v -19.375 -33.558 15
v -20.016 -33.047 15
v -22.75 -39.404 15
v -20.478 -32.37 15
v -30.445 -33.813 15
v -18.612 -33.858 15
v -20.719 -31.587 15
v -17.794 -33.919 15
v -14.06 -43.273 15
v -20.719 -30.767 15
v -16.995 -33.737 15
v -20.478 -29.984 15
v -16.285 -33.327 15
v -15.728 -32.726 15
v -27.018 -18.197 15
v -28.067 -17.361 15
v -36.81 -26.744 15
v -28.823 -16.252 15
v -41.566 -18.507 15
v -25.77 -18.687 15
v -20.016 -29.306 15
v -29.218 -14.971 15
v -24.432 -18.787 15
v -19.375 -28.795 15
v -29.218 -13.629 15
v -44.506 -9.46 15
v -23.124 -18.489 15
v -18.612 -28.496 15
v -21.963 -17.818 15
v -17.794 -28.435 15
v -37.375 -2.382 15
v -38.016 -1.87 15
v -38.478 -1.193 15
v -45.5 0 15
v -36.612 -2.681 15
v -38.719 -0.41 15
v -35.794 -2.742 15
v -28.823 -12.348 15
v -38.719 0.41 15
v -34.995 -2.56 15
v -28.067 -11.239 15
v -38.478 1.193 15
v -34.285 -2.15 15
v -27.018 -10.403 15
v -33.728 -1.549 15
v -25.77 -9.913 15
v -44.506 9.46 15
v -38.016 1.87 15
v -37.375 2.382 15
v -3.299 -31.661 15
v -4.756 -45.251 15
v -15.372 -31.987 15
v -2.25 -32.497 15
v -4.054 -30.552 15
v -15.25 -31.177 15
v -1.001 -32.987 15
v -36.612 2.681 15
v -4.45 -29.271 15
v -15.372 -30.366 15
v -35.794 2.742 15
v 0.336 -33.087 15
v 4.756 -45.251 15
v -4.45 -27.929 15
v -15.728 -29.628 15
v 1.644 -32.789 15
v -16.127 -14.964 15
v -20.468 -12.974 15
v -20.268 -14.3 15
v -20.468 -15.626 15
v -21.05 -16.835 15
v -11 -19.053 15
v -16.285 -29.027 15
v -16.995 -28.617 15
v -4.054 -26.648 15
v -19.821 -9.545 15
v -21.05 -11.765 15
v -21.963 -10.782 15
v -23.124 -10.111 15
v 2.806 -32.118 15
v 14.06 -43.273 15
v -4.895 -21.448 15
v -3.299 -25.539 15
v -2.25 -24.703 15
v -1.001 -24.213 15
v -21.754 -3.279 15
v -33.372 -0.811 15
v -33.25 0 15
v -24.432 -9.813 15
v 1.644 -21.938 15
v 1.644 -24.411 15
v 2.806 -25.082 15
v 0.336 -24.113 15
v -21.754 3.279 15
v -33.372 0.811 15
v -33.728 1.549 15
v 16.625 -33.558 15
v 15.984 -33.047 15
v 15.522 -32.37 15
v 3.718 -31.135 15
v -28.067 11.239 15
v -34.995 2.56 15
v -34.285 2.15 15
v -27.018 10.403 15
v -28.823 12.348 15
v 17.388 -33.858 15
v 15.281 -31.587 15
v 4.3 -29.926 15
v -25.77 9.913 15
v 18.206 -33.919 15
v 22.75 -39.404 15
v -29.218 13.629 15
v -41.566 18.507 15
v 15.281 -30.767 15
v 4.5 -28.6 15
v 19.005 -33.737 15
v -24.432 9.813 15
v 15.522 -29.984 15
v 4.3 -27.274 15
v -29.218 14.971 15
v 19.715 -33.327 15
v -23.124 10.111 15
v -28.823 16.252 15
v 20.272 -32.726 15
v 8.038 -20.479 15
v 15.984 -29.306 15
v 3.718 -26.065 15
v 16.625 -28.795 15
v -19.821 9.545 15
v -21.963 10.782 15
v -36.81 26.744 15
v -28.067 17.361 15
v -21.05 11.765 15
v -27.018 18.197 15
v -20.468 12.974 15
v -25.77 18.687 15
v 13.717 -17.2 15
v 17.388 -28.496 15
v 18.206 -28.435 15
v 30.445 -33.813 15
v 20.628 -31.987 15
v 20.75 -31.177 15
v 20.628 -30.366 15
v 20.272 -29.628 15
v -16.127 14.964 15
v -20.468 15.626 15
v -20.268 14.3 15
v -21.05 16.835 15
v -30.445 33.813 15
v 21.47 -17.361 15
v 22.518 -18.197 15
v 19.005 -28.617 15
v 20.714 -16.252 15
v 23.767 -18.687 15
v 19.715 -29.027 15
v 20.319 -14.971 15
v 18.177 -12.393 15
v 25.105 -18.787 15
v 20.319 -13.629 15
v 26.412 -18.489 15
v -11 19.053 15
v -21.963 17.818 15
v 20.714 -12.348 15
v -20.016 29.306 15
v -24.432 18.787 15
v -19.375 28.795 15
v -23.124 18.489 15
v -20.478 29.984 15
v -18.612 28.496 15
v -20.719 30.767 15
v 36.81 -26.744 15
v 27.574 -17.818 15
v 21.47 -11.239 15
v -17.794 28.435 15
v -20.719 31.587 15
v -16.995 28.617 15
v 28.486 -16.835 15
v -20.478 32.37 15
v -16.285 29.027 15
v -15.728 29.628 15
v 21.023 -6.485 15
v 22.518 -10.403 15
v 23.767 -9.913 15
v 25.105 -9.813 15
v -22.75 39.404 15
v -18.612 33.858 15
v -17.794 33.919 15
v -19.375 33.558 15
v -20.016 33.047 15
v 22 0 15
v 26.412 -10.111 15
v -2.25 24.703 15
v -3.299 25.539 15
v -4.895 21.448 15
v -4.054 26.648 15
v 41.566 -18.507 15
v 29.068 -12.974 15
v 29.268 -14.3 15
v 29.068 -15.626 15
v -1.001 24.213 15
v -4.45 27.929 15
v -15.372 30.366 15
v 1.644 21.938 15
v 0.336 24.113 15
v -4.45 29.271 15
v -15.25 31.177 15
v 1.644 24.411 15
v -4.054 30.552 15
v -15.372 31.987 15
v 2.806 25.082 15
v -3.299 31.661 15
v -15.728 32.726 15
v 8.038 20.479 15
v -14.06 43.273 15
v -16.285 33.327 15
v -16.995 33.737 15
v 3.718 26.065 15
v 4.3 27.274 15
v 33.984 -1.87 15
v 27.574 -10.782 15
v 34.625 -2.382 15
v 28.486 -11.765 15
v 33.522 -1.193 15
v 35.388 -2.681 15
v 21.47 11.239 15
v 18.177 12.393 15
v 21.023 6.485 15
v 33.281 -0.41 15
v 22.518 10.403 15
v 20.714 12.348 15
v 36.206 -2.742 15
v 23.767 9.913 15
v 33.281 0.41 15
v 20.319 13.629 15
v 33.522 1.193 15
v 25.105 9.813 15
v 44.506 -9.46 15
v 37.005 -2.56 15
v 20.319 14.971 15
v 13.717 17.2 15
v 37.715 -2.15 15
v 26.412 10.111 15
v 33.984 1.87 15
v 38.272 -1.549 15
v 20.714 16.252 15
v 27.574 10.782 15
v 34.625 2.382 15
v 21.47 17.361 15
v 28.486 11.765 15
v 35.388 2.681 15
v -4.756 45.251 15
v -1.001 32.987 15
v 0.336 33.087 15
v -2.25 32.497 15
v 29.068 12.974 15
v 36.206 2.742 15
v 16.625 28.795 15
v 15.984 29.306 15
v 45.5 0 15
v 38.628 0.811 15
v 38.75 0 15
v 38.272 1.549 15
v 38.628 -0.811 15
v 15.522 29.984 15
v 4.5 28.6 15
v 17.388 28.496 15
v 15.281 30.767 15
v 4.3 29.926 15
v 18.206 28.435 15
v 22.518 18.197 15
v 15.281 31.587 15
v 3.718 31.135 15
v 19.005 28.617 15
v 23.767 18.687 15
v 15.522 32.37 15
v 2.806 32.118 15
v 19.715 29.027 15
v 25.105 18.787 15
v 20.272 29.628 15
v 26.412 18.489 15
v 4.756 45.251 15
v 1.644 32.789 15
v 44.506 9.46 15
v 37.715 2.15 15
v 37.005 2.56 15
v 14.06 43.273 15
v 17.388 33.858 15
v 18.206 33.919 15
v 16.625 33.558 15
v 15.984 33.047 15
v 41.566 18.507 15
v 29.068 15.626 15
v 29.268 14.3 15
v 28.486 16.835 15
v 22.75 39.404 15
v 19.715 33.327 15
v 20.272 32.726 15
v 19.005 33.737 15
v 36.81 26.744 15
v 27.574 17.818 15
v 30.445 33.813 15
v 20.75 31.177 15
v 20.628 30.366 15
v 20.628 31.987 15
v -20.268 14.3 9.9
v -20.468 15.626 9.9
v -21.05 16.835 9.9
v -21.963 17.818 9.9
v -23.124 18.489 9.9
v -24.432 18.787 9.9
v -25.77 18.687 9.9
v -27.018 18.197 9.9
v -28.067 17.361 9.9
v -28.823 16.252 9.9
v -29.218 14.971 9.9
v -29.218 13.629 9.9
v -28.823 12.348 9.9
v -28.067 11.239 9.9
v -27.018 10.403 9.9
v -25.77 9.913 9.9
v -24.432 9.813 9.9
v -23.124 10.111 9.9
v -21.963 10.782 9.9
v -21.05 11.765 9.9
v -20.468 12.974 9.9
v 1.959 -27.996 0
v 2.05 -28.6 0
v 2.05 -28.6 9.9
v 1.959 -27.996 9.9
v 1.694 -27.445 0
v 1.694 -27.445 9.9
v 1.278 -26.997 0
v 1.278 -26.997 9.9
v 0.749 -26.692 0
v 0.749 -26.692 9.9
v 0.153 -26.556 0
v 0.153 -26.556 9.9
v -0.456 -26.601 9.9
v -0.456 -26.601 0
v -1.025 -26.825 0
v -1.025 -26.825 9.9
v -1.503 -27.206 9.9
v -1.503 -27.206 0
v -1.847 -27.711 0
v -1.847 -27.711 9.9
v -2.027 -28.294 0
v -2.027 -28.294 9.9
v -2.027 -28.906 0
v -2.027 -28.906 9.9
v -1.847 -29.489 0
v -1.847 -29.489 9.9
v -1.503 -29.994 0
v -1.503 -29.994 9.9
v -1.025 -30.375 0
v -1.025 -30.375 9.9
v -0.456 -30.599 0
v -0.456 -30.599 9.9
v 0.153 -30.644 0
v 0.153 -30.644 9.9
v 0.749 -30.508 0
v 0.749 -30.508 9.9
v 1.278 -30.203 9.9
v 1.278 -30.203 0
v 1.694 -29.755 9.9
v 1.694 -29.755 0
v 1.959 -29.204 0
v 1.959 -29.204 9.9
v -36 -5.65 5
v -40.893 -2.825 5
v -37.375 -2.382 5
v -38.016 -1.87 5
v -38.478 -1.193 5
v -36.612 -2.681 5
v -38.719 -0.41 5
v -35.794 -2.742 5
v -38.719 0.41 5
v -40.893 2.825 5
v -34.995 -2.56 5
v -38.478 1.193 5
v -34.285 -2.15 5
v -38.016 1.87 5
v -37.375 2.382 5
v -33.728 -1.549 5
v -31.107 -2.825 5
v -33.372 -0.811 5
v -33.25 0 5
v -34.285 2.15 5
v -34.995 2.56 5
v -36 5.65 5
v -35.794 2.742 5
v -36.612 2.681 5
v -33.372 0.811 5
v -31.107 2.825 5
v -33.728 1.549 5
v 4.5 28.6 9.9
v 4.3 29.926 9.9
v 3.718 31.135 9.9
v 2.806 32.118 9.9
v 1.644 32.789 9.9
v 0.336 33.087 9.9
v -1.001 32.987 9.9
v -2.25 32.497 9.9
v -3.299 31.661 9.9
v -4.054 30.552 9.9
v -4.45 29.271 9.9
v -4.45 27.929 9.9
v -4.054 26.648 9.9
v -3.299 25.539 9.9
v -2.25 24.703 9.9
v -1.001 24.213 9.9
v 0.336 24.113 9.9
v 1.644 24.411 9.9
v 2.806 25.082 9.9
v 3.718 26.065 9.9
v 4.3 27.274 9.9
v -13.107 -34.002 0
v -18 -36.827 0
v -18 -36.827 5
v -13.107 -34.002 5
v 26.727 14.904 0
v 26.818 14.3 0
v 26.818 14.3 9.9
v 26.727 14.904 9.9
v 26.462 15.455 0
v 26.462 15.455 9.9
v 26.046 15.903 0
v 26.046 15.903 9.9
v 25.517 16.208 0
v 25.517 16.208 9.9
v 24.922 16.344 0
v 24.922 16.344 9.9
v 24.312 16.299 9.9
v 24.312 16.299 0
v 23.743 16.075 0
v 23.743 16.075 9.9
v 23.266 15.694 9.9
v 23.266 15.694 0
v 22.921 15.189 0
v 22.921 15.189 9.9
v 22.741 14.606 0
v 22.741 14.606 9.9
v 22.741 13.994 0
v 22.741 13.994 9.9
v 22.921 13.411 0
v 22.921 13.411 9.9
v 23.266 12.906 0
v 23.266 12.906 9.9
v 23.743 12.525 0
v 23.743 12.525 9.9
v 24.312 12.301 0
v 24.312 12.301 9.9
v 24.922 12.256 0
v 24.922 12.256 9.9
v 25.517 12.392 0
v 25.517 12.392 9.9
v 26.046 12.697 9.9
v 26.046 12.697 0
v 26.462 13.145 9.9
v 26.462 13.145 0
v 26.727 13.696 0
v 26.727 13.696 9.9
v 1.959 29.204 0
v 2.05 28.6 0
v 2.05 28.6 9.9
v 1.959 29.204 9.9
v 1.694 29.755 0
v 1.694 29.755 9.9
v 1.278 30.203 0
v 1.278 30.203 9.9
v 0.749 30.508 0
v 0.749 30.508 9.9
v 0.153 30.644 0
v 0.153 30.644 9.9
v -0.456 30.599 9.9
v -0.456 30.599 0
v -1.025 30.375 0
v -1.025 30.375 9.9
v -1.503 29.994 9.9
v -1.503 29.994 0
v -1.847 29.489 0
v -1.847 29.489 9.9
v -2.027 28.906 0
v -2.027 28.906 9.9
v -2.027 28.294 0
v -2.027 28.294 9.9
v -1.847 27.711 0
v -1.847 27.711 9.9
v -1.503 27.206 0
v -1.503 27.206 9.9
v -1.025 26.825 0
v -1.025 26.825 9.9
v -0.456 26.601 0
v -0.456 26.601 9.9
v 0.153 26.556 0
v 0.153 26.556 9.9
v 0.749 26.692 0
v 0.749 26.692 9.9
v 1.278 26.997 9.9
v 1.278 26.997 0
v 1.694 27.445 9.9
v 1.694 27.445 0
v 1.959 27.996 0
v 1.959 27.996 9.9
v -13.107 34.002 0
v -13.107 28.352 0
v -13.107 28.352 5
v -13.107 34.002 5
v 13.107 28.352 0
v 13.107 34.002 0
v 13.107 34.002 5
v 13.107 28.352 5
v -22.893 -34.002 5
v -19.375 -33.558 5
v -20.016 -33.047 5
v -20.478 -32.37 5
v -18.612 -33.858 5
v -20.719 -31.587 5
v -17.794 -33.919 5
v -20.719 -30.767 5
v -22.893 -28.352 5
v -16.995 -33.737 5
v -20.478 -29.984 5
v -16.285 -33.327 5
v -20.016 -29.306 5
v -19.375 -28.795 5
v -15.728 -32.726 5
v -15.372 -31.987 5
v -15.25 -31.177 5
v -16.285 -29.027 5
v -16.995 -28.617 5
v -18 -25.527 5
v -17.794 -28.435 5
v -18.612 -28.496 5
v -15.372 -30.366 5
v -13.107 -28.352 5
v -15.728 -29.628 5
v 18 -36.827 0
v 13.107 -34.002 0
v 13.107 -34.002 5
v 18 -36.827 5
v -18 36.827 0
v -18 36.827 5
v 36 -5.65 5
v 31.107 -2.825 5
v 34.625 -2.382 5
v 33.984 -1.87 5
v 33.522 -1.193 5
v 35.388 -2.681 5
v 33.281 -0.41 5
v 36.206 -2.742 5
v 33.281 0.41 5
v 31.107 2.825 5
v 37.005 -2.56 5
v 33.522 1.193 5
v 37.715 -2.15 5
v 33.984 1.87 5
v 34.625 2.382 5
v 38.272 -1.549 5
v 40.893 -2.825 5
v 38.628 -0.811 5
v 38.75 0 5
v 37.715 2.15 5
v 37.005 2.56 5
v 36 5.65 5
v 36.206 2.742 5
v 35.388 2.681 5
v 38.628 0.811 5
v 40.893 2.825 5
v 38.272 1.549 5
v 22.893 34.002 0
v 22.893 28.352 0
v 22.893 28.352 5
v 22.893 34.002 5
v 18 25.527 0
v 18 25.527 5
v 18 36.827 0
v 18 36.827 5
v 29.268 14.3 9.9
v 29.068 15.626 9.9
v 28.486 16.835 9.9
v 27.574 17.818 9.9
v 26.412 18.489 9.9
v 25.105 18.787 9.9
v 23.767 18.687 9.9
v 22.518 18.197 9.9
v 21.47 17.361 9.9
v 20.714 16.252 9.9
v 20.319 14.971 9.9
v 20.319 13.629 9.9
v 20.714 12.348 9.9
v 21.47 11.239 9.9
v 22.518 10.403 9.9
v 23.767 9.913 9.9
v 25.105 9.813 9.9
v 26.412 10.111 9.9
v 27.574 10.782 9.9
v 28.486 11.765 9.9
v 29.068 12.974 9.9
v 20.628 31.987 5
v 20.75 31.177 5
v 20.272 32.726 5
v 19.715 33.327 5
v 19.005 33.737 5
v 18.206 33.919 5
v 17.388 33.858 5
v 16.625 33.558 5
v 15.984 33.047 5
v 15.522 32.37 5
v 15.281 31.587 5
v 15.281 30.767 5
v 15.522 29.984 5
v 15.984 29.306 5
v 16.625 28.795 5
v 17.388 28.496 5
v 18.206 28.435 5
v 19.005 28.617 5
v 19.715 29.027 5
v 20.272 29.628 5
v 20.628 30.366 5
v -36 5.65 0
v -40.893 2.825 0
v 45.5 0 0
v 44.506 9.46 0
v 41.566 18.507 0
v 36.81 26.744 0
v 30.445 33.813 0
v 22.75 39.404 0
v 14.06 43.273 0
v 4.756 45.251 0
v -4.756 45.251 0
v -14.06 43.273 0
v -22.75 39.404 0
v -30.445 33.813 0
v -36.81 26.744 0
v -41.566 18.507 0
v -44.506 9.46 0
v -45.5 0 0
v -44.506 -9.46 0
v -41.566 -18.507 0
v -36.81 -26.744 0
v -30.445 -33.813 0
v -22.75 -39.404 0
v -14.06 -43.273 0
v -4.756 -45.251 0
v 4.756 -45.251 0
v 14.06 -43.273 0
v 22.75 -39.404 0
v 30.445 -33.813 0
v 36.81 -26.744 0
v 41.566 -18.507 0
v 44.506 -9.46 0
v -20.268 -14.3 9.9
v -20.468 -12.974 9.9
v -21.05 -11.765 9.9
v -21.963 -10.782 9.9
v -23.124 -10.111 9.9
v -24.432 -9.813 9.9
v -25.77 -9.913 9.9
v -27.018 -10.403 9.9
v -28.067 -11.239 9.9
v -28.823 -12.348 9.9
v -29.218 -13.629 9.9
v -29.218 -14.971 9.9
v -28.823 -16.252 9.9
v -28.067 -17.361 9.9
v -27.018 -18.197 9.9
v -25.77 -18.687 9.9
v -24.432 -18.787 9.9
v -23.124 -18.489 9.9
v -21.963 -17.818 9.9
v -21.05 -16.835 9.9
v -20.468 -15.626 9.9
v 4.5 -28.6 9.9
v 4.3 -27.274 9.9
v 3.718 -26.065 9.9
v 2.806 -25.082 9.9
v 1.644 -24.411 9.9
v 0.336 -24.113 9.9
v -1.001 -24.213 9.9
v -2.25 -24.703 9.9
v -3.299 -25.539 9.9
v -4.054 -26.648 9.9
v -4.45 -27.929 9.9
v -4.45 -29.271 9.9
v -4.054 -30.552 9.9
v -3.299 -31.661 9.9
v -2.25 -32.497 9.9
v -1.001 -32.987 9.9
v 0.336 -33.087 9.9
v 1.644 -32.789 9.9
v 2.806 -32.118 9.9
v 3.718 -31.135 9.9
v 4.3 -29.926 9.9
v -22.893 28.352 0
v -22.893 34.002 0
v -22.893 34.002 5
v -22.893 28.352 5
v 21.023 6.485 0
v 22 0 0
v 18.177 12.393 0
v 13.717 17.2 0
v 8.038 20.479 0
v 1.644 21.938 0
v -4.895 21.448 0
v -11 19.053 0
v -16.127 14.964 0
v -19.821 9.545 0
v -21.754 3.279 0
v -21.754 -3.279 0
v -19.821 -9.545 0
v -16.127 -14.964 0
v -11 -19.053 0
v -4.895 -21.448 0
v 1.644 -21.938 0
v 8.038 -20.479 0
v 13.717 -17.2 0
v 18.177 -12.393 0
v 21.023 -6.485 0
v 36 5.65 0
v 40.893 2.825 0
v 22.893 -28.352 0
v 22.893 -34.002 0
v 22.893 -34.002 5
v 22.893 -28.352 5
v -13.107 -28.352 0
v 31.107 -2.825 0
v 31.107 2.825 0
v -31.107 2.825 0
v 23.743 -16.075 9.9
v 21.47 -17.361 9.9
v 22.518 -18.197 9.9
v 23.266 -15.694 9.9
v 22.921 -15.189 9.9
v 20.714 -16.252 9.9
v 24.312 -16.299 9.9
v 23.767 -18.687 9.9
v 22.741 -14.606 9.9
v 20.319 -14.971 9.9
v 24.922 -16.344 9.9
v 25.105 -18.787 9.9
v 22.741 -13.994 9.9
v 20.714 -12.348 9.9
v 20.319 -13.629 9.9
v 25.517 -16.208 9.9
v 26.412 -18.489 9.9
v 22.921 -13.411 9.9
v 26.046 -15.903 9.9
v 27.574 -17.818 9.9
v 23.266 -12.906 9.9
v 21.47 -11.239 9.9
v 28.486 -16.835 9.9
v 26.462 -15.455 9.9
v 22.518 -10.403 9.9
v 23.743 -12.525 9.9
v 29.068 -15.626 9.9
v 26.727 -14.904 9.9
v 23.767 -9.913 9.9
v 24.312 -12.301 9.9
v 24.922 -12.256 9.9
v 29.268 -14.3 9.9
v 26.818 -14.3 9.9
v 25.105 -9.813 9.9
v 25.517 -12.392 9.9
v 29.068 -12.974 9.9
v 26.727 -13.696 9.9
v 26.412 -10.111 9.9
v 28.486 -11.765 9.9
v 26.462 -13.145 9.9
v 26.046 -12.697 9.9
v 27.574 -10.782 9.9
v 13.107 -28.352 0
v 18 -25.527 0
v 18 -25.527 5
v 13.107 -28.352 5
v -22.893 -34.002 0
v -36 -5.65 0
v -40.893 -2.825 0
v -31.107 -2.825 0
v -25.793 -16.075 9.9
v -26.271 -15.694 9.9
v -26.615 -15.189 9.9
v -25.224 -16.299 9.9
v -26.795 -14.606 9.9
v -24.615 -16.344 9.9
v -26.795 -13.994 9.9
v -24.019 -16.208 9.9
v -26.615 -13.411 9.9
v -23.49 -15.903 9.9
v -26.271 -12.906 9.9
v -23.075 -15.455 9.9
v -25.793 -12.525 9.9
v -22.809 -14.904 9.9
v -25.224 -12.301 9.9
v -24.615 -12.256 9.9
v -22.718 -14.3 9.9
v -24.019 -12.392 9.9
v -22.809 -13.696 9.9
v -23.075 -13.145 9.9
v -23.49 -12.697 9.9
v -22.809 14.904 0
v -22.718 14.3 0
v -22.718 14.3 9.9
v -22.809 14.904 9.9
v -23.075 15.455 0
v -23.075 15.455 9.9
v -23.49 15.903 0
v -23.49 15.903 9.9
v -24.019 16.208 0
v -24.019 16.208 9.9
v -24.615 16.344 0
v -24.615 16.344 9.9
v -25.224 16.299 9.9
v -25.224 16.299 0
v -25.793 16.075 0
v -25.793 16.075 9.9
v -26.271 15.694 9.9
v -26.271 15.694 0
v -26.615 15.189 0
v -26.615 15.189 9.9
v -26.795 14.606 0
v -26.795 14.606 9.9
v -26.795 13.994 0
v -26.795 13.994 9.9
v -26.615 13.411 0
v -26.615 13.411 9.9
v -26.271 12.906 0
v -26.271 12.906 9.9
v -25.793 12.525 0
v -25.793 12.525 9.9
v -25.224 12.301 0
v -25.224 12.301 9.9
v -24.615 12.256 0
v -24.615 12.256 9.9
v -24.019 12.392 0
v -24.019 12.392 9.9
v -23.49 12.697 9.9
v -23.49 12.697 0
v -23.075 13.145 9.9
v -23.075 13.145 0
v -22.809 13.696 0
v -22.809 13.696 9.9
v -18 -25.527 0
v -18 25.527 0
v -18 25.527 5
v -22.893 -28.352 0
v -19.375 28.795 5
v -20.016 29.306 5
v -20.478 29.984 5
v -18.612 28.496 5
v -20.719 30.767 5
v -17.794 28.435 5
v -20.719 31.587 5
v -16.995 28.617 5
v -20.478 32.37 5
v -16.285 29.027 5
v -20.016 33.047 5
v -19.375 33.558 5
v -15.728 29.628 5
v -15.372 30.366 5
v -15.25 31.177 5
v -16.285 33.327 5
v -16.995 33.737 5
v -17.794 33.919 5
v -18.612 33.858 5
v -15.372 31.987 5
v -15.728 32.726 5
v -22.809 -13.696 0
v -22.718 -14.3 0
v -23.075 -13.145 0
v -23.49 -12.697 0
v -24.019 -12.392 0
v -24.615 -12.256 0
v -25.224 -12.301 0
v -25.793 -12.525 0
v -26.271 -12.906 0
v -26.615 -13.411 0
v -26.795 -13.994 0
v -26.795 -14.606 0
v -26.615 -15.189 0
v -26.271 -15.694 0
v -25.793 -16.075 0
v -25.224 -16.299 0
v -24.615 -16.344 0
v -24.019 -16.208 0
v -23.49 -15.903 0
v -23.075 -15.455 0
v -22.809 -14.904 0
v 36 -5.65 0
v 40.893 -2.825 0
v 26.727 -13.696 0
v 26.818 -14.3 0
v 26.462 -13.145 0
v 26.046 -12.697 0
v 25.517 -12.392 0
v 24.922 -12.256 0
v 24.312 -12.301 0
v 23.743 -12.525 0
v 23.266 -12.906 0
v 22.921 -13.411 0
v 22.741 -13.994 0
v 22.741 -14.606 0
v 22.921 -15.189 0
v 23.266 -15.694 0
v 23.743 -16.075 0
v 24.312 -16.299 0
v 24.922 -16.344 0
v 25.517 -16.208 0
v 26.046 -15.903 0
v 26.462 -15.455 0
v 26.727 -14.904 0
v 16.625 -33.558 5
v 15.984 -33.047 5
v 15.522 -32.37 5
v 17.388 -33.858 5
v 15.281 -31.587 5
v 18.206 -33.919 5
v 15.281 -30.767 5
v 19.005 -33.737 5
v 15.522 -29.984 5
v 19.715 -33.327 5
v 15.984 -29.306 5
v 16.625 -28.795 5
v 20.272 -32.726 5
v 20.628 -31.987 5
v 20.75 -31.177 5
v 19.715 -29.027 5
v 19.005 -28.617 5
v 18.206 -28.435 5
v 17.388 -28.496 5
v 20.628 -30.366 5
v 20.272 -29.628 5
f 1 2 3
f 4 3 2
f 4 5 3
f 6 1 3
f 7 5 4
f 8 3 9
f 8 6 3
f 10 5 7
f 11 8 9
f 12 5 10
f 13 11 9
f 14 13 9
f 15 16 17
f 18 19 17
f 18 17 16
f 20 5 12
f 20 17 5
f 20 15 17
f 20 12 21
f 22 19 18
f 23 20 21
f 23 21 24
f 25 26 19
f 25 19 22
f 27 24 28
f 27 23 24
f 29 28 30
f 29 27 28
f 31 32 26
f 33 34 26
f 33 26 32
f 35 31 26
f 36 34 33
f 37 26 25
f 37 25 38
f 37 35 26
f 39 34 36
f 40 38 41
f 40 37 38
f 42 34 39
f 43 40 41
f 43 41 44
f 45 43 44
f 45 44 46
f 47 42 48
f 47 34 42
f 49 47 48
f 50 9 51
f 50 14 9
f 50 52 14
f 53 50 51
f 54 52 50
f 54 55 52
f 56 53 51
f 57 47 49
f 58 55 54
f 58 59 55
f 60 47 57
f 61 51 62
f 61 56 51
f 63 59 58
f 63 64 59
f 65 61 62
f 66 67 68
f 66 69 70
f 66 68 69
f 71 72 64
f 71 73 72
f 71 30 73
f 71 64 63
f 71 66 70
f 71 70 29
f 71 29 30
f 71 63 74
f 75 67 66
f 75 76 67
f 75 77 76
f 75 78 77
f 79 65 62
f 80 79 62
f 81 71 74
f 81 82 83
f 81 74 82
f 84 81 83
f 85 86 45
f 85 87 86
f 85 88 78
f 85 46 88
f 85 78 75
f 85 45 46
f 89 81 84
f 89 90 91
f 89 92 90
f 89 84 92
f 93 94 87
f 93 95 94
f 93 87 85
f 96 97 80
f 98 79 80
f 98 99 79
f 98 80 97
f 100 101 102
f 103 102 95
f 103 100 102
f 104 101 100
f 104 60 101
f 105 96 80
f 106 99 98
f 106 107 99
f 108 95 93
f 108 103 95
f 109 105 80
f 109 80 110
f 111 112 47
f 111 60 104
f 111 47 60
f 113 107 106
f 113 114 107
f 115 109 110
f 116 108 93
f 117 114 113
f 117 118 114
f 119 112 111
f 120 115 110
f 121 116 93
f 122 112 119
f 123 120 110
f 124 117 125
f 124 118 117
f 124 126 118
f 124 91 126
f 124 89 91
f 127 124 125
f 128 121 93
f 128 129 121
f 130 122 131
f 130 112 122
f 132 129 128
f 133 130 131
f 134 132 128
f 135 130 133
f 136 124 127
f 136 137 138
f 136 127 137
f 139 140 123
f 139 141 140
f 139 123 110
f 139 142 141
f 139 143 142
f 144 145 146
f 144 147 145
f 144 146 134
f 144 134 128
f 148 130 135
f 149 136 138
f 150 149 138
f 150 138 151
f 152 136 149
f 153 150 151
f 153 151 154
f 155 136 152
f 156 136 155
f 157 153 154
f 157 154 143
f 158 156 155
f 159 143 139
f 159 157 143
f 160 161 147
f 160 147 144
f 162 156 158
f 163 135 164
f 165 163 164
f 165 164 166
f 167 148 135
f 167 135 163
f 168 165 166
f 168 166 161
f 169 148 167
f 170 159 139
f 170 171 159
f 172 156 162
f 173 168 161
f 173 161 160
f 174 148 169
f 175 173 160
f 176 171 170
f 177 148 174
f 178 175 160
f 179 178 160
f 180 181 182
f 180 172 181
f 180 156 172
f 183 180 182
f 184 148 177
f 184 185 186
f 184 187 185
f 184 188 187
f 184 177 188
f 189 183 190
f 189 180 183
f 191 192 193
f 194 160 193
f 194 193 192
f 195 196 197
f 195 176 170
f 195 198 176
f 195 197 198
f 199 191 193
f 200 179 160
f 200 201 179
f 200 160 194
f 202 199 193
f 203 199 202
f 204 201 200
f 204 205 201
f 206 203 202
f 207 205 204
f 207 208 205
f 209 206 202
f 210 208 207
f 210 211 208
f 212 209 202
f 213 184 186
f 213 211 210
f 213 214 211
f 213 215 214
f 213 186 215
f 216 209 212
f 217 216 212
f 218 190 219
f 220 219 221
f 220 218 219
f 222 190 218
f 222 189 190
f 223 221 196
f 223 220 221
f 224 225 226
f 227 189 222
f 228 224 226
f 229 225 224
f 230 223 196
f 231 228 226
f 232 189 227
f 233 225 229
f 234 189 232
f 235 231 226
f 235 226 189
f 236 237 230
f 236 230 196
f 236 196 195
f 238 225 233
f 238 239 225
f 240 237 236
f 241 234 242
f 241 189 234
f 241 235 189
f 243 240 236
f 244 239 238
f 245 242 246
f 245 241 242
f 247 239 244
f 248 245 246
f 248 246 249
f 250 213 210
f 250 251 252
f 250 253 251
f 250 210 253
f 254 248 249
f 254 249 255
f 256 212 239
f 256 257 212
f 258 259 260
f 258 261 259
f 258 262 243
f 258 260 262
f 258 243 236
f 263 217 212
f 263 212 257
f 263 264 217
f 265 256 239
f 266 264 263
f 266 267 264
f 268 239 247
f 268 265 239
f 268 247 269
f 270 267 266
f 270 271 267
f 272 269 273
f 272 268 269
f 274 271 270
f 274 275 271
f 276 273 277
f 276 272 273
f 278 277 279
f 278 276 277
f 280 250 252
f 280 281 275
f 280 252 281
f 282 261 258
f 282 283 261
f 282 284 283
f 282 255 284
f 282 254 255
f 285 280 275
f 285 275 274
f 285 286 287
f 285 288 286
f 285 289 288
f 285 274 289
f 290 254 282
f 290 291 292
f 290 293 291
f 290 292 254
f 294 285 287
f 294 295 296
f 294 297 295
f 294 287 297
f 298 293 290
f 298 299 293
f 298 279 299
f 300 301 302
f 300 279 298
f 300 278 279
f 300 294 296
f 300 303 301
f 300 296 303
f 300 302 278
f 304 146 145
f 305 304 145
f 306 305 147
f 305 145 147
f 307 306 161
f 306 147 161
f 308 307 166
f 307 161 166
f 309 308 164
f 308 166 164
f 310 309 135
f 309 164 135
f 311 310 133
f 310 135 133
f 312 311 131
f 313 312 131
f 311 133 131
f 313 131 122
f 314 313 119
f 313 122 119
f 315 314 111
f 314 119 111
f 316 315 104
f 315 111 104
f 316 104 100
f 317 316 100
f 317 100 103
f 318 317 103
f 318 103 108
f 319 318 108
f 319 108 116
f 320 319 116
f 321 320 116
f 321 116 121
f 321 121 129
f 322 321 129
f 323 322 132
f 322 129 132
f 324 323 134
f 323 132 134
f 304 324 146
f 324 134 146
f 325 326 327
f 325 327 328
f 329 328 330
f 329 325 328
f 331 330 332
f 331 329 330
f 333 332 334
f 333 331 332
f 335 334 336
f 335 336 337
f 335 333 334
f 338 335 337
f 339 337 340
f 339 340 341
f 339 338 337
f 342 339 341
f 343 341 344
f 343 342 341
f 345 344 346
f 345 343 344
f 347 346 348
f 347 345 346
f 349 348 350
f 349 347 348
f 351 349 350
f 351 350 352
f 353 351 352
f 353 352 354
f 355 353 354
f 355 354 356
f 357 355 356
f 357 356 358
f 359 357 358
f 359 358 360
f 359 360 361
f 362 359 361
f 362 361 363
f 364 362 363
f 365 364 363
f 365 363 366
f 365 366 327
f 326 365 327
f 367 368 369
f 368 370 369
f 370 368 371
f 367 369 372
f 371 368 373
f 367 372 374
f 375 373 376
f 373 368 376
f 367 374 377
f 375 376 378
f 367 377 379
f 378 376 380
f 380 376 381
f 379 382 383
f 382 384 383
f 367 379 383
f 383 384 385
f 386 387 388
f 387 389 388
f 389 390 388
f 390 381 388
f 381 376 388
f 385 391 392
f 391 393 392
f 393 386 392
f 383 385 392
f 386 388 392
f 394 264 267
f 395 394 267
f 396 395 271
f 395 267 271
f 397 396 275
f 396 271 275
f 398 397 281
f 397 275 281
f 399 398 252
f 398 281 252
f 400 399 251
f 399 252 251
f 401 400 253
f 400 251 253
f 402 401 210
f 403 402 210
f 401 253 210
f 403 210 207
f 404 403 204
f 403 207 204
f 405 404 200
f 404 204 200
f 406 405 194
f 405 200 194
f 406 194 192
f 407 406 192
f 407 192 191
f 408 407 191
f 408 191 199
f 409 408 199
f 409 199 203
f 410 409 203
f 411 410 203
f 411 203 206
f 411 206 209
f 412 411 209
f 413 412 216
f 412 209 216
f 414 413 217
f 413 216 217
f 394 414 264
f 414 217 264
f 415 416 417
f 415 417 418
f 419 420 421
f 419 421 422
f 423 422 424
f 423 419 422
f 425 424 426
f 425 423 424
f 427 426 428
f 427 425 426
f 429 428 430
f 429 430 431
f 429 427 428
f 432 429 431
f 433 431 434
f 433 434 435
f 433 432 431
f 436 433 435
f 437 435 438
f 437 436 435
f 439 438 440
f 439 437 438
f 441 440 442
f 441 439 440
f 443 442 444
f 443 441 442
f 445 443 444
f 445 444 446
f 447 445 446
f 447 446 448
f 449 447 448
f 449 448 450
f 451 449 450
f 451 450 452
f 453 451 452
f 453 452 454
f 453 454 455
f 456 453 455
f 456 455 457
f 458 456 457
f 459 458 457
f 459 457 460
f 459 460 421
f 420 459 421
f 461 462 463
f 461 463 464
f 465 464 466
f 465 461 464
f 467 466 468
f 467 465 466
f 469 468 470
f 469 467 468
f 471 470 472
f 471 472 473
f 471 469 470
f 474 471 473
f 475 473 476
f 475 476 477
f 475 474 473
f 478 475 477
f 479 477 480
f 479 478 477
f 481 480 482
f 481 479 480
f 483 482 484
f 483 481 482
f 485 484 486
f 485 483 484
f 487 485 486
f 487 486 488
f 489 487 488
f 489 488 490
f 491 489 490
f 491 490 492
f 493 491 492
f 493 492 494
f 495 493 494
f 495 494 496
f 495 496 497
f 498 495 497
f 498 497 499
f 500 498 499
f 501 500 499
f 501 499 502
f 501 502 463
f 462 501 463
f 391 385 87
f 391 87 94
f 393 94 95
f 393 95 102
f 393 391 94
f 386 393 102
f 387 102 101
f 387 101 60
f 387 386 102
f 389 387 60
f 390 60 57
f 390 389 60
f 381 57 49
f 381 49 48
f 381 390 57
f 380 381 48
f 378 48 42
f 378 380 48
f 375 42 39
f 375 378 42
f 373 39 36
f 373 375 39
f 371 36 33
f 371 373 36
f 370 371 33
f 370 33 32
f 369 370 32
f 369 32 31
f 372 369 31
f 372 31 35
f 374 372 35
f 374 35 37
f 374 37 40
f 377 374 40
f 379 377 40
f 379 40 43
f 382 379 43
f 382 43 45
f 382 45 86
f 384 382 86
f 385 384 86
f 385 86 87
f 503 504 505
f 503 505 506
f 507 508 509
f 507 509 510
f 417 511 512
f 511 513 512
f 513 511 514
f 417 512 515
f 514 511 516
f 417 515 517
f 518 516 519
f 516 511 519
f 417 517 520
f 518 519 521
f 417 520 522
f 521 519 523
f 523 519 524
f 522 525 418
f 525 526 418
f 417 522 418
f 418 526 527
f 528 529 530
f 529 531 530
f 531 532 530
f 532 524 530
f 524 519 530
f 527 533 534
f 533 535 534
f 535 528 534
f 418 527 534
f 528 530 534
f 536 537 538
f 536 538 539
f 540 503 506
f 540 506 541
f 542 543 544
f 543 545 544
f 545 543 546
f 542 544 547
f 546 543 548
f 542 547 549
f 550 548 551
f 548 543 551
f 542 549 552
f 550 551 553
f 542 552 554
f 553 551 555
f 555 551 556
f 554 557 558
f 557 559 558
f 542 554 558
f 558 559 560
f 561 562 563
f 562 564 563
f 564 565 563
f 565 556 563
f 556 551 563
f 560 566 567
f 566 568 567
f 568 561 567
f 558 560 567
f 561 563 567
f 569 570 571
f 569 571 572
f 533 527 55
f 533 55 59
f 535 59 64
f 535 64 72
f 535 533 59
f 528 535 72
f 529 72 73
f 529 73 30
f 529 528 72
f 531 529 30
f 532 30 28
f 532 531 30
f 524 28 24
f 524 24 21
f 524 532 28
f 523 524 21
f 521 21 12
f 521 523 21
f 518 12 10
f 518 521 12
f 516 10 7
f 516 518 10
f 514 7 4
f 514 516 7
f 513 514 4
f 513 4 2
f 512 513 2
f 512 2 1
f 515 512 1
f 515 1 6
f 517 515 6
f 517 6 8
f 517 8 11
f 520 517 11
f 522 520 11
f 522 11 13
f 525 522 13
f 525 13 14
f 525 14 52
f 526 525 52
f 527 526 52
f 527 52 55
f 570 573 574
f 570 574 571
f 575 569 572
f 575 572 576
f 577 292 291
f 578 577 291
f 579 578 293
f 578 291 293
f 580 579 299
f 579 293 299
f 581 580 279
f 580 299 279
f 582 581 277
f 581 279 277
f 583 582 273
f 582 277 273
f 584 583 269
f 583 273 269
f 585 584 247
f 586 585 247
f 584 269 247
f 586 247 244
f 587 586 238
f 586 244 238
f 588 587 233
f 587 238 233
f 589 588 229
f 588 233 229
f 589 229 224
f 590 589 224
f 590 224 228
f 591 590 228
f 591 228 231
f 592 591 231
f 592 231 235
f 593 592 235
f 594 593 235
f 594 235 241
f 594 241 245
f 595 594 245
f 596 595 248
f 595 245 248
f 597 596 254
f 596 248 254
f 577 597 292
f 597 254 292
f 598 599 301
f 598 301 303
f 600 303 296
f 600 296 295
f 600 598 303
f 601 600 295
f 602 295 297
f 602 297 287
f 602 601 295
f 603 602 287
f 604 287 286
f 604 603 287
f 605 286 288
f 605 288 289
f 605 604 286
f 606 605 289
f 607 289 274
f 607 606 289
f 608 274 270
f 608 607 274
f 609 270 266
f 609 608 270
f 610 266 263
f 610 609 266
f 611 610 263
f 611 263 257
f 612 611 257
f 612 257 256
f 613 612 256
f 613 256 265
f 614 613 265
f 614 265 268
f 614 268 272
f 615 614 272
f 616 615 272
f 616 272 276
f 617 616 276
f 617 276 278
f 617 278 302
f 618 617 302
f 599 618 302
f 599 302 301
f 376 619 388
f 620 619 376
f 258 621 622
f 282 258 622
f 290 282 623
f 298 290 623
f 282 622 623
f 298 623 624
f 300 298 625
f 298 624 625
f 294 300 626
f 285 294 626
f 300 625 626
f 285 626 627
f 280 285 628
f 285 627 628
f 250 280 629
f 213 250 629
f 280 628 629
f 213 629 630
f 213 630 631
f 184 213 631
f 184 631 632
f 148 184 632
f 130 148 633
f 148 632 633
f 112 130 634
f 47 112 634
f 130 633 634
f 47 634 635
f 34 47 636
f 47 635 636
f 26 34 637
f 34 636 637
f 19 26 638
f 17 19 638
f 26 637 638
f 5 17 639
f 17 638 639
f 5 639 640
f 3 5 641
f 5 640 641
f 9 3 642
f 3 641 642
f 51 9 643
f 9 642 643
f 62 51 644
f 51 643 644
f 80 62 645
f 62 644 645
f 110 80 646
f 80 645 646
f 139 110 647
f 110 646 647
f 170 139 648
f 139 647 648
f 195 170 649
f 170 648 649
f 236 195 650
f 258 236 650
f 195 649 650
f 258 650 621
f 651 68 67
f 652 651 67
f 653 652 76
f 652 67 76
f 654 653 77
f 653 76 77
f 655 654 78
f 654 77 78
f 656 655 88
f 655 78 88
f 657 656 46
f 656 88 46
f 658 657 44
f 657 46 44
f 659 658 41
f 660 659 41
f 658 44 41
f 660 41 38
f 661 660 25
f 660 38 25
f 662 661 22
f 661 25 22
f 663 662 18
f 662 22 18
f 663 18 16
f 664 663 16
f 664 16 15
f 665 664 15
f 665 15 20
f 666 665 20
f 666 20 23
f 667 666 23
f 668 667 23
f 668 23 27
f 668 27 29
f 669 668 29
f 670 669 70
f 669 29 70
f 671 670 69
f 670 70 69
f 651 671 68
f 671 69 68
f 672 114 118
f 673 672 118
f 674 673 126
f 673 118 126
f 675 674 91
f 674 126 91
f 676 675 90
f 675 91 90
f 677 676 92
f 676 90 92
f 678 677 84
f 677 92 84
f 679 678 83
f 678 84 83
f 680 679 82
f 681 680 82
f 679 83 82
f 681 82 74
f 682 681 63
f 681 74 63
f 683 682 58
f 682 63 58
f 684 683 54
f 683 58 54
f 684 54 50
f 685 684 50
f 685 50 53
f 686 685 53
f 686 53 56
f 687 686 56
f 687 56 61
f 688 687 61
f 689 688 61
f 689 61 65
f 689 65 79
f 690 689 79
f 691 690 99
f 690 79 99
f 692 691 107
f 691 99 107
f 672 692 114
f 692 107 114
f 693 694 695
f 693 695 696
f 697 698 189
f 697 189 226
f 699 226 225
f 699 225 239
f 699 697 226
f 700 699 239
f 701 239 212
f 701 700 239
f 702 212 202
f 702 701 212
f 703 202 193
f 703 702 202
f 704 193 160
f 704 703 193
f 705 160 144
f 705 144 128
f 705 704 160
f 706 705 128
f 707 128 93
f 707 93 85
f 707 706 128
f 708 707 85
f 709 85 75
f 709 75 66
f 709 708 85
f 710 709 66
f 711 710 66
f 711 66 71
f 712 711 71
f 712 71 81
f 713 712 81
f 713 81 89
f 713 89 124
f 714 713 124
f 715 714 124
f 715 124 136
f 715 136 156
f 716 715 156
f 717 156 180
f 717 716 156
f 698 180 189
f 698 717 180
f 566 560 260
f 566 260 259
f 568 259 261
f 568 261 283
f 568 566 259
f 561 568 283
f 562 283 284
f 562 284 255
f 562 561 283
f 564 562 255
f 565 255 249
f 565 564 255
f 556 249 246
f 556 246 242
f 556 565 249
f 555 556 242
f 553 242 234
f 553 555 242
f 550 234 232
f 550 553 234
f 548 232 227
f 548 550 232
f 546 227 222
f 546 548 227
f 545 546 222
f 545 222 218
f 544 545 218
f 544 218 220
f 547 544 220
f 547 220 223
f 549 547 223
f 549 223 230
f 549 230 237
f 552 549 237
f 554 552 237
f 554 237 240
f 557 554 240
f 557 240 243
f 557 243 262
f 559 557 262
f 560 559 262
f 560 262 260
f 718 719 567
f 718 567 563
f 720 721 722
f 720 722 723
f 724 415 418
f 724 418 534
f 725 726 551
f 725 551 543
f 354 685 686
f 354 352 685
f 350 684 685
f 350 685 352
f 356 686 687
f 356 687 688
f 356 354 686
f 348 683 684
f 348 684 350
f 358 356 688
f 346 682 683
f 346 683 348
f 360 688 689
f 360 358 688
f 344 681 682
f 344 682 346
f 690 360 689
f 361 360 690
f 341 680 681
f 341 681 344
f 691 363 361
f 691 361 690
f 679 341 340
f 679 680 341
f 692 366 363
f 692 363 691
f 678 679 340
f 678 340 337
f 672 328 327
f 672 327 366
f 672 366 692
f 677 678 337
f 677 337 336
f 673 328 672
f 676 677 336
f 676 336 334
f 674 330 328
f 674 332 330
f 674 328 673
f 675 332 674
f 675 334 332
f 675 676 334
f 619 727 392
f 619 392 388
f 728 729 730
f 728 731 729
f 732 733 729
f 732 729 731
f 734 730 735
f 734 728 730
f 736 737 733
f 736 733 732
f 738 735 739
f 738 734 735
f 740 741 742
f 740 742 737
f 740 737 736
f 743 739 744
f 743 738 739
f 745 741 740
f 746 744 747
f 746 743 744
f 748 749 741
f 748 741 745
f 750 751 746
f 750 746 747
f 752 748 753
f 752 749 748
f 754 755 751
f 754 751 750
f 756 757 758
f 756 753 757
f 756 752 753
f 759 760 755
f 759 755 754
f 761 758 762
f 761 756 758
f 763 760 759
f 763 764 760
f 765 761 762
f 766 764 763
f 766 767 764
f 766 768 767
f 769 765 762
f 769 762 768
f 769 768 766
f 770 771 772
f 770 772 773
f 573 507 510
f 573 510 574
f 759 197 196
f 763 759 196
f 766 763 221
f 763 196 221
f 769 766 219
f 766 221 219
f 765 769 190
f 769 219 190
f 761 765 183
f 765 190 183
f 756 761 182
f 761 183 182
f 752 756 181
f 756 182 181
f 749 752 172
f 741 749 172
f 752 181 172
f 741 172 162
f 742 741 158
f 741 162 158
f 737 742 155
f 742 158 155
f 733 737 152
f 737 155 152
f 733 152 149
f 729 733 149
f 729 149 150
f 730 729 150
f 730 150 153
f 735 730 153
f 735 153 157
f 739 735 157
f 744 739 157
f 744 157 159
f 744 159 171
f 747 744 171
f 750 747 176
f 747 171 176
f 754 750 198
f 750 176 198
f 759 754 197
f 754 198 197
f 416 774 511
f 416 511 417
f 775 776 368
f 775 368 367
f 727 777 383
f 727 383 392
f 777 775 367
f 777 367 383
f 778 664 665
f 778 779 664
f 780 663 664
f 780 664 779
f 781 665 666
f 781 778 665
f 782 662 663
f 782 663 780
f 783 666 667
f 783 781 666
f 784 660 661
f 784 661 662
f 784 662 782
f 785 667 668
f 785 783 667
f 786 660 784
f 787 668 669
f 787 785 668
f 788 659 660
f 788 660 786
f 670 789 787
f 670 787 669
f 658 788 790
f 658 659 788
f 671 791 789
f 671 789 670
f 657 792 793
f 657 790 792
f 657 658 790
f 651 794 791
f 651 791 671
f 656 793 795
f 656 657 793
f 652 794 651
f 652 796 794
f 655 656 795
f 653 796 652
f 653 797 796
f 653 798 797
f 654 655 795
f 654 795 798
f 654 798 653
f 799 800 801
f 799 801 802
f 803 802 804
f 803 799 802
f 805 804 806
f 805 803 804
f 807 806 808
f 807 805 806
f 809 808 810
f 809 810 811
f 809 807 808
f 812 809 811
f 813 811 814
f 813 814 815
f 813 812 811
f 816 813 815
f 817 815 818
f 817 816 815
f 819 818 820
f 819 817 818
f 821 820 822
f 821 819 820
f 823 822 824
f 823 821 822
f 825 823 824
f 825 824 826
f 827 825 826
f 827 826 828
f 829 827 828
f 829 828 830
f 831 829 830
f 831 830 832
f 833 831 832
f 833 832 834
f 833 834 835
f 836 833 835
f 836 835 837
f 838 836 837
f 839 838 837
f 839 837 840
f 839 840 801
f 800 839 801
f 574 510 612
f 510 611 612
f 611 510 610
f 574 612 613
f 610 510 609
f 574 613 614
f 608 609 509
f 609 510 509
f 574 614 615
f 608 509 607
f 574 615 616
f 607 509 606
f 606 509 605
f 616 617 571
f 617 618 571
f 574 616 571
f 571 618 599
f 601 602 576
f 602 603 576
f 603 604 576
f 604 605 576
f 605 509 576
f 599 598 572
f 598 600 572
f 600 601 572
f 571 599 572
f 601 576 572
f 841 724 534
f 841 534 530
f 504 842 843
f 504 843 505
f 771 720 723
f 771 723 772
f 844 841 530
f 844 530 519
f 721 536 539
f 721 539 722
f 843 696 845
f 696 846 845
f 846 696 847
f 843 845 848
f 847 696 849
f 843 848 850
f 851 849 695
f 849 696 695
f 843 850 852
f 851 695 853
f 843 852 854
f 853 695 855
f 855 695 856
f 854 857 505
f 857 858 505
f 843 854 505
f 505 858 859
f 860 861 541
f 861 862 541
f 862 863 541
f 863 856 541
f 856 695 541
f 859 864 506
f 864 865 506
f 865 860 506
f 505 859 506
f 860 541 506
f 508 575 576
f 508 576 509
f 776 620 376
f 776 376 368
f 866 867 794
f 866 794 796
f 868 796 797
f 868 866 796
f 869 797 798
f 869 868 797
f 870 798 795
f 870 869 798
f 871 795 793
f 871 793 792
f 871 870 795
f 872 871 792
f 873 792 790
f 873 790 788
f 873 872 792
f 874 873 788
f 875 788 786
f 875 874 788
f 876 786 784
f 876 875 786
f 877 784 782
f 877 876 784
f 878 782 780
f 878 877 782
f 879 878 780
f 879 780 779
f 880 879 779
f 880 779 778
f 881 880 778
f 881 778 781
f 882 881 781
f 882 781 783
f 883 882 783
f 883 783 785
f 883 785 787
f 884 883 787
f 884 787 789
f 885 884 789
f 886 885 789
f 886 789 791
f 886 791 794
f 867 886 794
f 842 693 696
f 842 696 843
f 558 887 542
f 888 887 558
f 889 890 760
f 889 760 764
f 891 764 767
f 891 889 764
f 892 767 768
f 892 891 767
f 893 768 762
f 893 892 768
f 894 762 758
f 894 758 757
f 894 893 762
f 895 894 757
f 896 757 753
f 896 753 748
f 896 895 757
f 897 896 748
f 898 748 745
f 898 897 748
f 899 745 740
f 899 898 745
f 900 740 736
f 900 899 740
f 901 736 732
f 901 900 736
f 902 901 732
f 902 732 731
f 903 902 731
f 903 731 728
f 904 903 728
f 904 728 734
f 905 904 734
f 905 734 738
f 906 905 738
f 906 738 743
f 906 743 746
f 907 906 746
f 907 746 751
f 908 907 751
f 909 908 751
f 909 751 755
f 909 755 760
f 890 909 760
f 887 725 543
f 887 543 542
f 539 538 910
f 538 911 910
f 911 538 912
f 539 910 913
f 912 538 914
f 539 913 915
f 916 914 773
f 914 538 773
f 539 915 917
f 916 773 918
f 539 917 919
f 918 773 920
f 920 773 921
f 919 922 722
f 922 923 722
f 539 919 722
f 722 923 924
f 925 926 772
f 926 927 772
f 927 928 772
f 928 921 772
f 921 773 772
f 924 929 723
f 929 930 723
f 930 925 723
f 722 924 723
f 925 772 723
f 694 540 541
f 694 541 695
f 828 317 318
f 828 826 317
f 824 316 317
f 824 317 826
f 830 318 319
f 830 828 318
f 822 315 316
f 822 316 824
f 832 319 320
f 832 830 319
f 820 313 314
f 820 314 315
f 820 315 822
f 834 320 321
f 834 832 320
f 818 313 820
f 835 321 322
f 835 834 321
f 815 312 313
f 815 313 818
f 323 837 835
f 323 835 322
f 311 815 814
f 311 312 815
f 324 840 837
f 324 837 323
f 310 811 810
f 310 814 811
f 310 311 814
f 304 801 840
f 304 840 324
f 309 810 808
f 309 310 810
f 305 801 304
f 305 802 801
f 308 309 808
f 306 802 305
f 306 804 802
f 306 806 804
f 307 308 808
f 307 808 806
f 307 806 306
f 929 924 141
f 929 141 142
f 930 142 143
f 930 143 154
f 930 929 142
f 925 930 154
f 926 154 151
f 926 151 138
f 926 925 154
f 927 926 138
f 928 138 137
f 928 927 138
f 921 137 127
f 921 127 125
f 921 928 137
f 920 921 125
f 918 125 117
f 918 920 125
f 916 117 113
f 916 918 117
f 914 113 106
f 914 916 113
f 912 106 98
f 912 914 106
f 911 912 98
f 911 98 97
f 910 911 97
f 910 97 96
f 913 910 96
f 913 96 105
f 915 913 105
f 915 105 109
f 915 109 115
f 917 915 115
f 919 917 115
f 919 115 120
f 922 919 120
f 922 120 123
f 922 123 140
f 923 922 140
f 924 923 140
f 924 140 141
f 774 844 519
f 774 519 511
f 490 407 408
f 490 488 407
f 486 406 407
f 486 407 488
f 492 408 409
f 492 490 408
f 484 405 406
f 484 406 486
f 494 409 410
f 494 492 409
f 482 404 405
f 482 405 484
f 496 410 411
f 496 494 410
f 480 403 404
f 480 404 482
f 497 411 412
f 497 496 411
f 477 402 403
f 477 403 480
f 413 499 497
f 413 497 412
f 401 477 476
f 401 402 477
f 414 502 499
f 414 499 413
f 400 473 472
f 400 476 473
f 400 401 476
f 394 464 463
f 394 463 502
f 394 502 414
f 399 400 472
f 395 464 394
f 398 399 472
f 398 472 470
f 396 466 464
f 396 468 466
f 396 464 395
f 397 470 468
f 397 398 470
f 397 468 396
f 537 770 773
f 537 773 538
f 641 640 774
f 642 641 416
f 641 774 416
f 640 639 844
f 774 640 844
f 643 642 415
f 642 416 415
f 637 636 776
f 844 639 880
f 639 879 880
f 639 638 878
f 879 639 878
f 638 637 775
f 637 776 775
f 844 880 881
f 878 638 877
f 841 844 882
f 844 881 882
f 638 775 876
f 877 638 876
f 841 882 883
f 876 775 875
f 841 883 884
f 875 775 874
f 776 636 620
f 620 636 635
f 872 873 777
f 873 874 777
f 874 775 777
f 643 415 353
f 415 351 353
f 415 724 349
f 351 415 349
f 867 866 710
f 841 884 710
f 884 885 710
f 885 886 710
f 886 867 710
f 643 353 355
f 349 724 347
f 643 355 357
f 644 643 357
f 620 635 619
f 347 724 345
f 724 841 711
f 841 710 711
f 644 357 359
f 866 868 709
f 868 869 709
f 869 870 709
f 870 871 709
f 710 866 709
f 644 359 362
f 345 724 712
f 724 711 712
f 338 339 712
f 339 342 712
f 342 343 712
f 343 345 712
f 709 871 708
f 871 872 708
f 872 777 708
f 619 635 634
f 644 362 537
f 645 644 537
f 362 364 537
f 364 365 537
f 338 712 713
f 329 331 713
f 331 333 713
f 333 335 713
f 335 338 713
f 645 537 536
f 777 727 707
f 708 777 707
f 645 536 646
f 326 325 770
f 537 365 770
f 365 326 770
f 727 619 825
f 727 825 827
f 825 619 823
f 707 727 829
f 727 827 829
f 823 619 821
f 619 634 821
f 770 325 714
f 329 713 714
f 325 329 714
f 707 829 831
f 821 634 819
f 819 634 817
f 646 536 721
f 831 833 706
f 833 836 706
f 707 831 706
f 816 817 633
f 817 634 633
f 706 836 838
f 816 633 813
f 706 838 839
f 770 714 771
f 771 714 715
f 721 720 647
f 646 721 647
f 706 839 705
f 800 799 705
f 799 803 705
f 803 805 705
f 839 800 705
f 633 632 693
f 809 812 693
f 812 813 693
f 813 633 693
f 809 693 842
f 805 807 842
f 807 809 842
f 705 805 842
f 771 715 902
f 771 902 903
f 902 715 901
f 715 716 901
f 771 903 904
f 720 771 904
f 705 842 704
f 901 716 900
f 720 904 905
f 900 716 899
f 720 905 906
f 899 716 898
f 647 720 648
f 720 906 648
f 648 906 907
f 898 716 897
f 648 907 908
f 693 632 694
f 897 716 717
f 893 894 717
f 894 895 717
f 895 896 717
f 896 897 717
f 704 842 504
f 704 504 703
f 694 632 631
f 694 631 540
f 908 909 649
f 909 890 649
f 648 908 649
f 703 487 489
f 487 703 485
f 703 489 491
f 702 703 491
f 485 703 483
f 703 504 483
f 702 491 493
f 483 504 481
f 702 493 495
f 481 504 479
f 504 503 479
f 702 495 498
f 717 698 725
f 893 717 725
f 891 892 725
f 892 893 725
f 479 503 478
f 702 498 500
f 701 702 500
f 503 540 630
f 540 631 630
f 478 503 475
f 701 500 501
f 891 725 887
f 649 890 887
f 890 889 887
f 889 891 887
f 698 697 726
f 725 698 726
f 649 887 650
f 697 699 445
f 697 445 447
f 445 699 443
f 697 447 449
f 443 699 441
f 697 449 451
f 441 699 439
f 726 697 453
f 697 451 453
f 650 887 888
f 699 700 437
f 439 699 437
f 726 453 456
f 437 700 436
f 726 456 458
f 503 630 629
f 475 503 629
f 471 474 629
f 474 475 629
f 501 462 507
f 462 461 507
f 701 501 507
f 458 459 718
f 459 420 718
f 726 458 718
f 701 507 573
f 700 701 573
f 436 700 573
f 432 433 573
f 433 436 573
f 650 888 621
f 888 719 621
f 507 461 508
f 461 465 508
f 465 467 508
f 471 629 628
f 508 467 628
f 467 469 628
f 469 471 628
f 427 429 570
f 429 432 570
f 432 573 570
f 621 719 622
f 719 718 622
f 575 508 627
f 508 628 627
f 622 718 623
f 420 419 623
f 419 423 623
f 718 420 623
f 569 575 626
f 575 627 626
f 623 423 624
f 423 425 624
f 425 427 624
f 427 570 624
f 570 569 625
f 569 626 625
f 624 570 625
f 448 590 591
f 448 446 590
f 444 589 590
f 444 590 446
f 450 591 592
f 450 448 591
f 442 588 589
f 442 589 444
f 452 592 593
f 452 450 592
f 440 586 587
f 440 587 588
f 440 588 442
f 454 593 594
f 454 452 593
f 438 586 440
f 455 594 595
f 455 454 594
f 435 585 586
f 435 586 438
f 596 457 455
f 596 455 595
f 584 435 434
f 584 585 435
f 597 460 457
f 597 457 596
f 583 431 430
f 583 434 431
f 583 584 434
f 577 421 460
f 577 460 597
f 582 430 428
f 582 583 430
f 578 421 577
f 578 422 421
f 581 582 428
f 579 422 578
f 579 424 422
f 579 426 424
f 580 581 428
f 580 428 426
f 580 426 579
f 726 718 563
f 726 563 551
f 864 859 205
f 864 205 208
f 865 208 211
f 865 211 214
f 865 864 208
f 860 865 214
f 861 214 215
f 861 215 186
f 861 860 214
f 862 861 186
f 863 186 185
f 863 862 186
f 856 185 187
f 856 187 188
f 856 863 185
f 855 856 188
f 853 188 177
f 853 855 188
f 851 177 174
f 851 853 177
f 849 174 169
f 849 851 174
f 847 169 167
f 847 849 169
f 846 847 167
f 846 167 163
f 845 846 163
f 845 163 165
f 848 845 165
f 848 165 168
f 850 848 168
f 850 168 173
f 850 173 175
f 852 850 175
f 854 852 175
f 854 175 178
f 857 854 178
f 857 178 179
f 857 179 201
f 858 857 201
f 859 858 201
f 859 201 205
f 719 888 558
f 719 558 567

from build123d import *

# Parameters (mm, degrees)
F0_R     = 45.5
F0_R_2   = 2.05
F0_R_3   = 22
F0_R_4   = 2.75
F1_DEPTH = 15
F2_R     = 4.5
F2_R_2   = 2.05
F3_DEPTH = 5.1
F4_DEPTH = 5


with BuildPart() as f1:
    # F0 (on Top) → F1 (new body)
    with BuildSketch(Plane.XY):
        Circle(F0_R)
        Polygon((-22.893044, -28.351915), (-18, -25.526915), (-13.106956, -28.351915), (-13.106956, -34.001915), (-18, -36.826915), (-22.893044, -34.001915), align=None, mode=Mode.SUBTRACT)
        with Locations((-24.768327, -14.3)):
            Circle(F0_R_2, mode=Mode.SUBTRACT)
        with Locations((0, -28.6)):
            Circle(F0_R_2, mode=Mode.SUBTRACT)
        Polygon((13.106956, -34.001915), (13.106956, -28.351915), (18, -25.526915), (22.893044, -28.351915), (22.893044, -34.001915), (18, -36.826915), align=None, mode=Mode.SUBTRACT)
        with Locations((24.768327, -14.3)):
            Circle(F0_R_2, mode=Mode.SUBTRACT)
        Polygon((-36, 5.65), (-31.106956, 2.825), (-31.106956, -2.825), (-36, -5.65), (-40.893044, -2.825), (-40.893044, 2.825), align=None, mode=Mode.SUBTRACT)
        with Locations((-24.768327, 14.3)):
            Circle(F0_R_2, mode=Mode.SUBTRACT)
        Polygon((-13.106956, 34.001915), (-13.106956, 28.351915), (-18, 25.526915), (-22.893044, 28.351915), (-22.893044, 34.001915), (-18, 36.826915), align=None, mode=Mode.SUBTRACT)
        Circle(F0_R_3, mode=Mode.SUBTRACT)
        Polygon((36, -5.65), (31.106956, -2.825), (31.106956, 2.825), (36, 5.65), (40.893044, 2.825), (40.893044, -2.825), align=None, mode=Mode.SUBTRACT)
        with Locations((24.768327, 14.3)):
            Circle(F0_R_2, mode=Mode.SUBTRACT)
        with Locations((0, 28.6)):
            Circle(F0_R_2, mode=Mode.SUBTRACT)
        Polygon((22.893044, 28.351915), (18, 25.526915), (13.106956, 28.351915), (13.106956, 34.001915), (18, 36.826915), (22.893044, 34.001915), align=None, mode=Mode.SUBTRACT)
        Polygon((-31.106956, -2.825), (-31.106956, 2.825), (-36, 5.65), (-40.893044, 2.825), (-40.893044, -2.825), (-36, -5.65), align=None)
        with Locations((-36, 0)):
            Circle(F0_R_4, mode=Mode.SUBTRACT)
        Polygon((-13.106956, -28.351915), (-18, -25.526915), (-22.893044, -28.351915), (-22.893044, -34.001915), (-18, -36.826915), (-13.106956, -34.001915), align=None)
        with Locations((-18, -31.176915)):
            Circle(F0_R_4, mode=Mode.SUBTRACT)
        Polygon((18, -25.526915), (13.106956, -28.351915), (13.106956, -34.001915), (18, -36.826915), (22.893044, -34.001915), (22.893044, -28.351915), align=None)
        with Locations((18, -31.176915)):
            Circle(F0_R_4, mode=Mode.SUBTRACT)
        Polygon((31.106956, 2.825), (31.106956, -2.825), (36, -5.65), (40.893044, -2.825), (40.893044, 2.825), (36, 5.65), align=None)
        with Locations((36, 0)):
            Circle(F0_R_4, mode=Mode.SUBTRACT)
        Polygon((13.106956, 28.351915), (18, 25.526915), (22.893044, 28.351915), (22.893044, 34.001915), (18, 36.826915), (13.106956, 34.001915), align=None)
        with Locations((18, 31.176915)):
            Circle(F0_R_4, mode=Mode.SUBTRACT)
        Polygon((-18, 25.526915), (-13.106956, 28.351915), (-13.106956, 34.001915), (-18, 36.826915), (-22.893044, 34.001915), (-22.893044, 28.351915), align=None)
        with Locations((-18, 31.176915)):
            Circle(F0_R_4, mode=Mode.SUBTRACT)
    extrude(amount=F1_DEPTH)

    # F2 (on face) → F3 (cut)
    with BuildSketch(Plane.XY.offset(15)):
        with Locations((24.768327, 14.3)):
            Circle(F2_R)
        with Locations((24.768327, 14.3)):
            Circle(F2_R_2, mode=Mode.SUBTRACT)
        with Locations((-24.768327, 14.3)):
            Circle(F2_R)
        with Locations((-24.768327, 14.3)):
            Circle(F2_R_2, mode=Mode.SUBTRACT)
        with Locations((0, 28.6)):
            Circle(F2_R)
        with Locations((0, 28.6)):
            Circle(F2_R_2, mode=Mode.SUBTRACT)
        with Locations((-24.768327, -14.3)):
            Circle(F2_R)
        with Locations((-24.768327, -14.3)):
            Circle(F2_R_2, mode=Mode.SUBTRACT)
        with Locations((0, -28.6)):
            Circle(F2_R)
        with Locations((0, -28.6)):
            Circle(F2_R_2, mode=Mode.SUBTRACT)
        with Locations((24.768327, -14.3)):
            Circle(F2_R)
        with Locations((24.768327, -14.3)):
            Circle(F2_R_2, mode=Mode.SUBTRACT)
    extrude(amount=-F3_DEPTH, mode=Mode.SUBTRACT)

    # F0 (on Top) → F4 (cut)
    with BuildSketch(Plane.XY):
        Polygon((-13.106956, -28.351915), (-18, -25.526915), (-22.893044, -28.351915), (-22.893044, -34.001915), (-18, -36.826915), (-13.106956, -34.001915), align=None)
        with Locations((-18, -31.176915)):
            Circle(F0_R_4, mode=Mode.SUBTRACT)
        Polygon((18, -25.526915), (13.106956, -28.351915), (13.106956, -34.001915), (18, -36.826915), (22.893044, -34.001915), (22.893044, -28.351915), align=None)
        with Locations((18, -31.176915)):
            Circle(F0_R_4, mode=Mode.SUBTRACT)
        Polygon((31.106956, 2.825), (31.106956, -2.825), (36, -5.65), (40.893044, -2.825), (40.893044, 2.825), (36, 5.65), align=None)
        with Locations((36, 0)):
            Circle(F0_R_4, mode=Mode.SUBTRACT)
        Polygon((13.106956, 28.351915), (18, 25.526915), (22.893044, 28.351915), (22.893044, 34.001915), (18, 36.826915), (13.106956, 34.001915), align=None)
        with Locations((18, 31.176915)):
            Circle(F0_R_4, mode=Mode.SUBTRACT)
        Polygon((-18, 25.526915), (-13.106956, 28.351915), (-13.106956, 34.001915), (-18, 36.826915), (-22.893044, 34.001915), (-22.893044, 28.351915), align=None)
        with Locations((-18, 31.176915)):
            Circle(F0_R_4, mode=Mode.SUBTRACT)
        Polygon((-31.106956, -2.825), (-31.106956, 2.825), (-36, 5.65), (-40.893044, 2.825), (-40.893044, -2.825), (-36, -5.65), align=None)
        with Locations((-36, 0)):
            Circle(F0_R_4, mode=Mode.SUBTRACT)
    extrude(amount=F4_DEPTH, mode=Mode.SUBTRACT)


solid = f1.part
